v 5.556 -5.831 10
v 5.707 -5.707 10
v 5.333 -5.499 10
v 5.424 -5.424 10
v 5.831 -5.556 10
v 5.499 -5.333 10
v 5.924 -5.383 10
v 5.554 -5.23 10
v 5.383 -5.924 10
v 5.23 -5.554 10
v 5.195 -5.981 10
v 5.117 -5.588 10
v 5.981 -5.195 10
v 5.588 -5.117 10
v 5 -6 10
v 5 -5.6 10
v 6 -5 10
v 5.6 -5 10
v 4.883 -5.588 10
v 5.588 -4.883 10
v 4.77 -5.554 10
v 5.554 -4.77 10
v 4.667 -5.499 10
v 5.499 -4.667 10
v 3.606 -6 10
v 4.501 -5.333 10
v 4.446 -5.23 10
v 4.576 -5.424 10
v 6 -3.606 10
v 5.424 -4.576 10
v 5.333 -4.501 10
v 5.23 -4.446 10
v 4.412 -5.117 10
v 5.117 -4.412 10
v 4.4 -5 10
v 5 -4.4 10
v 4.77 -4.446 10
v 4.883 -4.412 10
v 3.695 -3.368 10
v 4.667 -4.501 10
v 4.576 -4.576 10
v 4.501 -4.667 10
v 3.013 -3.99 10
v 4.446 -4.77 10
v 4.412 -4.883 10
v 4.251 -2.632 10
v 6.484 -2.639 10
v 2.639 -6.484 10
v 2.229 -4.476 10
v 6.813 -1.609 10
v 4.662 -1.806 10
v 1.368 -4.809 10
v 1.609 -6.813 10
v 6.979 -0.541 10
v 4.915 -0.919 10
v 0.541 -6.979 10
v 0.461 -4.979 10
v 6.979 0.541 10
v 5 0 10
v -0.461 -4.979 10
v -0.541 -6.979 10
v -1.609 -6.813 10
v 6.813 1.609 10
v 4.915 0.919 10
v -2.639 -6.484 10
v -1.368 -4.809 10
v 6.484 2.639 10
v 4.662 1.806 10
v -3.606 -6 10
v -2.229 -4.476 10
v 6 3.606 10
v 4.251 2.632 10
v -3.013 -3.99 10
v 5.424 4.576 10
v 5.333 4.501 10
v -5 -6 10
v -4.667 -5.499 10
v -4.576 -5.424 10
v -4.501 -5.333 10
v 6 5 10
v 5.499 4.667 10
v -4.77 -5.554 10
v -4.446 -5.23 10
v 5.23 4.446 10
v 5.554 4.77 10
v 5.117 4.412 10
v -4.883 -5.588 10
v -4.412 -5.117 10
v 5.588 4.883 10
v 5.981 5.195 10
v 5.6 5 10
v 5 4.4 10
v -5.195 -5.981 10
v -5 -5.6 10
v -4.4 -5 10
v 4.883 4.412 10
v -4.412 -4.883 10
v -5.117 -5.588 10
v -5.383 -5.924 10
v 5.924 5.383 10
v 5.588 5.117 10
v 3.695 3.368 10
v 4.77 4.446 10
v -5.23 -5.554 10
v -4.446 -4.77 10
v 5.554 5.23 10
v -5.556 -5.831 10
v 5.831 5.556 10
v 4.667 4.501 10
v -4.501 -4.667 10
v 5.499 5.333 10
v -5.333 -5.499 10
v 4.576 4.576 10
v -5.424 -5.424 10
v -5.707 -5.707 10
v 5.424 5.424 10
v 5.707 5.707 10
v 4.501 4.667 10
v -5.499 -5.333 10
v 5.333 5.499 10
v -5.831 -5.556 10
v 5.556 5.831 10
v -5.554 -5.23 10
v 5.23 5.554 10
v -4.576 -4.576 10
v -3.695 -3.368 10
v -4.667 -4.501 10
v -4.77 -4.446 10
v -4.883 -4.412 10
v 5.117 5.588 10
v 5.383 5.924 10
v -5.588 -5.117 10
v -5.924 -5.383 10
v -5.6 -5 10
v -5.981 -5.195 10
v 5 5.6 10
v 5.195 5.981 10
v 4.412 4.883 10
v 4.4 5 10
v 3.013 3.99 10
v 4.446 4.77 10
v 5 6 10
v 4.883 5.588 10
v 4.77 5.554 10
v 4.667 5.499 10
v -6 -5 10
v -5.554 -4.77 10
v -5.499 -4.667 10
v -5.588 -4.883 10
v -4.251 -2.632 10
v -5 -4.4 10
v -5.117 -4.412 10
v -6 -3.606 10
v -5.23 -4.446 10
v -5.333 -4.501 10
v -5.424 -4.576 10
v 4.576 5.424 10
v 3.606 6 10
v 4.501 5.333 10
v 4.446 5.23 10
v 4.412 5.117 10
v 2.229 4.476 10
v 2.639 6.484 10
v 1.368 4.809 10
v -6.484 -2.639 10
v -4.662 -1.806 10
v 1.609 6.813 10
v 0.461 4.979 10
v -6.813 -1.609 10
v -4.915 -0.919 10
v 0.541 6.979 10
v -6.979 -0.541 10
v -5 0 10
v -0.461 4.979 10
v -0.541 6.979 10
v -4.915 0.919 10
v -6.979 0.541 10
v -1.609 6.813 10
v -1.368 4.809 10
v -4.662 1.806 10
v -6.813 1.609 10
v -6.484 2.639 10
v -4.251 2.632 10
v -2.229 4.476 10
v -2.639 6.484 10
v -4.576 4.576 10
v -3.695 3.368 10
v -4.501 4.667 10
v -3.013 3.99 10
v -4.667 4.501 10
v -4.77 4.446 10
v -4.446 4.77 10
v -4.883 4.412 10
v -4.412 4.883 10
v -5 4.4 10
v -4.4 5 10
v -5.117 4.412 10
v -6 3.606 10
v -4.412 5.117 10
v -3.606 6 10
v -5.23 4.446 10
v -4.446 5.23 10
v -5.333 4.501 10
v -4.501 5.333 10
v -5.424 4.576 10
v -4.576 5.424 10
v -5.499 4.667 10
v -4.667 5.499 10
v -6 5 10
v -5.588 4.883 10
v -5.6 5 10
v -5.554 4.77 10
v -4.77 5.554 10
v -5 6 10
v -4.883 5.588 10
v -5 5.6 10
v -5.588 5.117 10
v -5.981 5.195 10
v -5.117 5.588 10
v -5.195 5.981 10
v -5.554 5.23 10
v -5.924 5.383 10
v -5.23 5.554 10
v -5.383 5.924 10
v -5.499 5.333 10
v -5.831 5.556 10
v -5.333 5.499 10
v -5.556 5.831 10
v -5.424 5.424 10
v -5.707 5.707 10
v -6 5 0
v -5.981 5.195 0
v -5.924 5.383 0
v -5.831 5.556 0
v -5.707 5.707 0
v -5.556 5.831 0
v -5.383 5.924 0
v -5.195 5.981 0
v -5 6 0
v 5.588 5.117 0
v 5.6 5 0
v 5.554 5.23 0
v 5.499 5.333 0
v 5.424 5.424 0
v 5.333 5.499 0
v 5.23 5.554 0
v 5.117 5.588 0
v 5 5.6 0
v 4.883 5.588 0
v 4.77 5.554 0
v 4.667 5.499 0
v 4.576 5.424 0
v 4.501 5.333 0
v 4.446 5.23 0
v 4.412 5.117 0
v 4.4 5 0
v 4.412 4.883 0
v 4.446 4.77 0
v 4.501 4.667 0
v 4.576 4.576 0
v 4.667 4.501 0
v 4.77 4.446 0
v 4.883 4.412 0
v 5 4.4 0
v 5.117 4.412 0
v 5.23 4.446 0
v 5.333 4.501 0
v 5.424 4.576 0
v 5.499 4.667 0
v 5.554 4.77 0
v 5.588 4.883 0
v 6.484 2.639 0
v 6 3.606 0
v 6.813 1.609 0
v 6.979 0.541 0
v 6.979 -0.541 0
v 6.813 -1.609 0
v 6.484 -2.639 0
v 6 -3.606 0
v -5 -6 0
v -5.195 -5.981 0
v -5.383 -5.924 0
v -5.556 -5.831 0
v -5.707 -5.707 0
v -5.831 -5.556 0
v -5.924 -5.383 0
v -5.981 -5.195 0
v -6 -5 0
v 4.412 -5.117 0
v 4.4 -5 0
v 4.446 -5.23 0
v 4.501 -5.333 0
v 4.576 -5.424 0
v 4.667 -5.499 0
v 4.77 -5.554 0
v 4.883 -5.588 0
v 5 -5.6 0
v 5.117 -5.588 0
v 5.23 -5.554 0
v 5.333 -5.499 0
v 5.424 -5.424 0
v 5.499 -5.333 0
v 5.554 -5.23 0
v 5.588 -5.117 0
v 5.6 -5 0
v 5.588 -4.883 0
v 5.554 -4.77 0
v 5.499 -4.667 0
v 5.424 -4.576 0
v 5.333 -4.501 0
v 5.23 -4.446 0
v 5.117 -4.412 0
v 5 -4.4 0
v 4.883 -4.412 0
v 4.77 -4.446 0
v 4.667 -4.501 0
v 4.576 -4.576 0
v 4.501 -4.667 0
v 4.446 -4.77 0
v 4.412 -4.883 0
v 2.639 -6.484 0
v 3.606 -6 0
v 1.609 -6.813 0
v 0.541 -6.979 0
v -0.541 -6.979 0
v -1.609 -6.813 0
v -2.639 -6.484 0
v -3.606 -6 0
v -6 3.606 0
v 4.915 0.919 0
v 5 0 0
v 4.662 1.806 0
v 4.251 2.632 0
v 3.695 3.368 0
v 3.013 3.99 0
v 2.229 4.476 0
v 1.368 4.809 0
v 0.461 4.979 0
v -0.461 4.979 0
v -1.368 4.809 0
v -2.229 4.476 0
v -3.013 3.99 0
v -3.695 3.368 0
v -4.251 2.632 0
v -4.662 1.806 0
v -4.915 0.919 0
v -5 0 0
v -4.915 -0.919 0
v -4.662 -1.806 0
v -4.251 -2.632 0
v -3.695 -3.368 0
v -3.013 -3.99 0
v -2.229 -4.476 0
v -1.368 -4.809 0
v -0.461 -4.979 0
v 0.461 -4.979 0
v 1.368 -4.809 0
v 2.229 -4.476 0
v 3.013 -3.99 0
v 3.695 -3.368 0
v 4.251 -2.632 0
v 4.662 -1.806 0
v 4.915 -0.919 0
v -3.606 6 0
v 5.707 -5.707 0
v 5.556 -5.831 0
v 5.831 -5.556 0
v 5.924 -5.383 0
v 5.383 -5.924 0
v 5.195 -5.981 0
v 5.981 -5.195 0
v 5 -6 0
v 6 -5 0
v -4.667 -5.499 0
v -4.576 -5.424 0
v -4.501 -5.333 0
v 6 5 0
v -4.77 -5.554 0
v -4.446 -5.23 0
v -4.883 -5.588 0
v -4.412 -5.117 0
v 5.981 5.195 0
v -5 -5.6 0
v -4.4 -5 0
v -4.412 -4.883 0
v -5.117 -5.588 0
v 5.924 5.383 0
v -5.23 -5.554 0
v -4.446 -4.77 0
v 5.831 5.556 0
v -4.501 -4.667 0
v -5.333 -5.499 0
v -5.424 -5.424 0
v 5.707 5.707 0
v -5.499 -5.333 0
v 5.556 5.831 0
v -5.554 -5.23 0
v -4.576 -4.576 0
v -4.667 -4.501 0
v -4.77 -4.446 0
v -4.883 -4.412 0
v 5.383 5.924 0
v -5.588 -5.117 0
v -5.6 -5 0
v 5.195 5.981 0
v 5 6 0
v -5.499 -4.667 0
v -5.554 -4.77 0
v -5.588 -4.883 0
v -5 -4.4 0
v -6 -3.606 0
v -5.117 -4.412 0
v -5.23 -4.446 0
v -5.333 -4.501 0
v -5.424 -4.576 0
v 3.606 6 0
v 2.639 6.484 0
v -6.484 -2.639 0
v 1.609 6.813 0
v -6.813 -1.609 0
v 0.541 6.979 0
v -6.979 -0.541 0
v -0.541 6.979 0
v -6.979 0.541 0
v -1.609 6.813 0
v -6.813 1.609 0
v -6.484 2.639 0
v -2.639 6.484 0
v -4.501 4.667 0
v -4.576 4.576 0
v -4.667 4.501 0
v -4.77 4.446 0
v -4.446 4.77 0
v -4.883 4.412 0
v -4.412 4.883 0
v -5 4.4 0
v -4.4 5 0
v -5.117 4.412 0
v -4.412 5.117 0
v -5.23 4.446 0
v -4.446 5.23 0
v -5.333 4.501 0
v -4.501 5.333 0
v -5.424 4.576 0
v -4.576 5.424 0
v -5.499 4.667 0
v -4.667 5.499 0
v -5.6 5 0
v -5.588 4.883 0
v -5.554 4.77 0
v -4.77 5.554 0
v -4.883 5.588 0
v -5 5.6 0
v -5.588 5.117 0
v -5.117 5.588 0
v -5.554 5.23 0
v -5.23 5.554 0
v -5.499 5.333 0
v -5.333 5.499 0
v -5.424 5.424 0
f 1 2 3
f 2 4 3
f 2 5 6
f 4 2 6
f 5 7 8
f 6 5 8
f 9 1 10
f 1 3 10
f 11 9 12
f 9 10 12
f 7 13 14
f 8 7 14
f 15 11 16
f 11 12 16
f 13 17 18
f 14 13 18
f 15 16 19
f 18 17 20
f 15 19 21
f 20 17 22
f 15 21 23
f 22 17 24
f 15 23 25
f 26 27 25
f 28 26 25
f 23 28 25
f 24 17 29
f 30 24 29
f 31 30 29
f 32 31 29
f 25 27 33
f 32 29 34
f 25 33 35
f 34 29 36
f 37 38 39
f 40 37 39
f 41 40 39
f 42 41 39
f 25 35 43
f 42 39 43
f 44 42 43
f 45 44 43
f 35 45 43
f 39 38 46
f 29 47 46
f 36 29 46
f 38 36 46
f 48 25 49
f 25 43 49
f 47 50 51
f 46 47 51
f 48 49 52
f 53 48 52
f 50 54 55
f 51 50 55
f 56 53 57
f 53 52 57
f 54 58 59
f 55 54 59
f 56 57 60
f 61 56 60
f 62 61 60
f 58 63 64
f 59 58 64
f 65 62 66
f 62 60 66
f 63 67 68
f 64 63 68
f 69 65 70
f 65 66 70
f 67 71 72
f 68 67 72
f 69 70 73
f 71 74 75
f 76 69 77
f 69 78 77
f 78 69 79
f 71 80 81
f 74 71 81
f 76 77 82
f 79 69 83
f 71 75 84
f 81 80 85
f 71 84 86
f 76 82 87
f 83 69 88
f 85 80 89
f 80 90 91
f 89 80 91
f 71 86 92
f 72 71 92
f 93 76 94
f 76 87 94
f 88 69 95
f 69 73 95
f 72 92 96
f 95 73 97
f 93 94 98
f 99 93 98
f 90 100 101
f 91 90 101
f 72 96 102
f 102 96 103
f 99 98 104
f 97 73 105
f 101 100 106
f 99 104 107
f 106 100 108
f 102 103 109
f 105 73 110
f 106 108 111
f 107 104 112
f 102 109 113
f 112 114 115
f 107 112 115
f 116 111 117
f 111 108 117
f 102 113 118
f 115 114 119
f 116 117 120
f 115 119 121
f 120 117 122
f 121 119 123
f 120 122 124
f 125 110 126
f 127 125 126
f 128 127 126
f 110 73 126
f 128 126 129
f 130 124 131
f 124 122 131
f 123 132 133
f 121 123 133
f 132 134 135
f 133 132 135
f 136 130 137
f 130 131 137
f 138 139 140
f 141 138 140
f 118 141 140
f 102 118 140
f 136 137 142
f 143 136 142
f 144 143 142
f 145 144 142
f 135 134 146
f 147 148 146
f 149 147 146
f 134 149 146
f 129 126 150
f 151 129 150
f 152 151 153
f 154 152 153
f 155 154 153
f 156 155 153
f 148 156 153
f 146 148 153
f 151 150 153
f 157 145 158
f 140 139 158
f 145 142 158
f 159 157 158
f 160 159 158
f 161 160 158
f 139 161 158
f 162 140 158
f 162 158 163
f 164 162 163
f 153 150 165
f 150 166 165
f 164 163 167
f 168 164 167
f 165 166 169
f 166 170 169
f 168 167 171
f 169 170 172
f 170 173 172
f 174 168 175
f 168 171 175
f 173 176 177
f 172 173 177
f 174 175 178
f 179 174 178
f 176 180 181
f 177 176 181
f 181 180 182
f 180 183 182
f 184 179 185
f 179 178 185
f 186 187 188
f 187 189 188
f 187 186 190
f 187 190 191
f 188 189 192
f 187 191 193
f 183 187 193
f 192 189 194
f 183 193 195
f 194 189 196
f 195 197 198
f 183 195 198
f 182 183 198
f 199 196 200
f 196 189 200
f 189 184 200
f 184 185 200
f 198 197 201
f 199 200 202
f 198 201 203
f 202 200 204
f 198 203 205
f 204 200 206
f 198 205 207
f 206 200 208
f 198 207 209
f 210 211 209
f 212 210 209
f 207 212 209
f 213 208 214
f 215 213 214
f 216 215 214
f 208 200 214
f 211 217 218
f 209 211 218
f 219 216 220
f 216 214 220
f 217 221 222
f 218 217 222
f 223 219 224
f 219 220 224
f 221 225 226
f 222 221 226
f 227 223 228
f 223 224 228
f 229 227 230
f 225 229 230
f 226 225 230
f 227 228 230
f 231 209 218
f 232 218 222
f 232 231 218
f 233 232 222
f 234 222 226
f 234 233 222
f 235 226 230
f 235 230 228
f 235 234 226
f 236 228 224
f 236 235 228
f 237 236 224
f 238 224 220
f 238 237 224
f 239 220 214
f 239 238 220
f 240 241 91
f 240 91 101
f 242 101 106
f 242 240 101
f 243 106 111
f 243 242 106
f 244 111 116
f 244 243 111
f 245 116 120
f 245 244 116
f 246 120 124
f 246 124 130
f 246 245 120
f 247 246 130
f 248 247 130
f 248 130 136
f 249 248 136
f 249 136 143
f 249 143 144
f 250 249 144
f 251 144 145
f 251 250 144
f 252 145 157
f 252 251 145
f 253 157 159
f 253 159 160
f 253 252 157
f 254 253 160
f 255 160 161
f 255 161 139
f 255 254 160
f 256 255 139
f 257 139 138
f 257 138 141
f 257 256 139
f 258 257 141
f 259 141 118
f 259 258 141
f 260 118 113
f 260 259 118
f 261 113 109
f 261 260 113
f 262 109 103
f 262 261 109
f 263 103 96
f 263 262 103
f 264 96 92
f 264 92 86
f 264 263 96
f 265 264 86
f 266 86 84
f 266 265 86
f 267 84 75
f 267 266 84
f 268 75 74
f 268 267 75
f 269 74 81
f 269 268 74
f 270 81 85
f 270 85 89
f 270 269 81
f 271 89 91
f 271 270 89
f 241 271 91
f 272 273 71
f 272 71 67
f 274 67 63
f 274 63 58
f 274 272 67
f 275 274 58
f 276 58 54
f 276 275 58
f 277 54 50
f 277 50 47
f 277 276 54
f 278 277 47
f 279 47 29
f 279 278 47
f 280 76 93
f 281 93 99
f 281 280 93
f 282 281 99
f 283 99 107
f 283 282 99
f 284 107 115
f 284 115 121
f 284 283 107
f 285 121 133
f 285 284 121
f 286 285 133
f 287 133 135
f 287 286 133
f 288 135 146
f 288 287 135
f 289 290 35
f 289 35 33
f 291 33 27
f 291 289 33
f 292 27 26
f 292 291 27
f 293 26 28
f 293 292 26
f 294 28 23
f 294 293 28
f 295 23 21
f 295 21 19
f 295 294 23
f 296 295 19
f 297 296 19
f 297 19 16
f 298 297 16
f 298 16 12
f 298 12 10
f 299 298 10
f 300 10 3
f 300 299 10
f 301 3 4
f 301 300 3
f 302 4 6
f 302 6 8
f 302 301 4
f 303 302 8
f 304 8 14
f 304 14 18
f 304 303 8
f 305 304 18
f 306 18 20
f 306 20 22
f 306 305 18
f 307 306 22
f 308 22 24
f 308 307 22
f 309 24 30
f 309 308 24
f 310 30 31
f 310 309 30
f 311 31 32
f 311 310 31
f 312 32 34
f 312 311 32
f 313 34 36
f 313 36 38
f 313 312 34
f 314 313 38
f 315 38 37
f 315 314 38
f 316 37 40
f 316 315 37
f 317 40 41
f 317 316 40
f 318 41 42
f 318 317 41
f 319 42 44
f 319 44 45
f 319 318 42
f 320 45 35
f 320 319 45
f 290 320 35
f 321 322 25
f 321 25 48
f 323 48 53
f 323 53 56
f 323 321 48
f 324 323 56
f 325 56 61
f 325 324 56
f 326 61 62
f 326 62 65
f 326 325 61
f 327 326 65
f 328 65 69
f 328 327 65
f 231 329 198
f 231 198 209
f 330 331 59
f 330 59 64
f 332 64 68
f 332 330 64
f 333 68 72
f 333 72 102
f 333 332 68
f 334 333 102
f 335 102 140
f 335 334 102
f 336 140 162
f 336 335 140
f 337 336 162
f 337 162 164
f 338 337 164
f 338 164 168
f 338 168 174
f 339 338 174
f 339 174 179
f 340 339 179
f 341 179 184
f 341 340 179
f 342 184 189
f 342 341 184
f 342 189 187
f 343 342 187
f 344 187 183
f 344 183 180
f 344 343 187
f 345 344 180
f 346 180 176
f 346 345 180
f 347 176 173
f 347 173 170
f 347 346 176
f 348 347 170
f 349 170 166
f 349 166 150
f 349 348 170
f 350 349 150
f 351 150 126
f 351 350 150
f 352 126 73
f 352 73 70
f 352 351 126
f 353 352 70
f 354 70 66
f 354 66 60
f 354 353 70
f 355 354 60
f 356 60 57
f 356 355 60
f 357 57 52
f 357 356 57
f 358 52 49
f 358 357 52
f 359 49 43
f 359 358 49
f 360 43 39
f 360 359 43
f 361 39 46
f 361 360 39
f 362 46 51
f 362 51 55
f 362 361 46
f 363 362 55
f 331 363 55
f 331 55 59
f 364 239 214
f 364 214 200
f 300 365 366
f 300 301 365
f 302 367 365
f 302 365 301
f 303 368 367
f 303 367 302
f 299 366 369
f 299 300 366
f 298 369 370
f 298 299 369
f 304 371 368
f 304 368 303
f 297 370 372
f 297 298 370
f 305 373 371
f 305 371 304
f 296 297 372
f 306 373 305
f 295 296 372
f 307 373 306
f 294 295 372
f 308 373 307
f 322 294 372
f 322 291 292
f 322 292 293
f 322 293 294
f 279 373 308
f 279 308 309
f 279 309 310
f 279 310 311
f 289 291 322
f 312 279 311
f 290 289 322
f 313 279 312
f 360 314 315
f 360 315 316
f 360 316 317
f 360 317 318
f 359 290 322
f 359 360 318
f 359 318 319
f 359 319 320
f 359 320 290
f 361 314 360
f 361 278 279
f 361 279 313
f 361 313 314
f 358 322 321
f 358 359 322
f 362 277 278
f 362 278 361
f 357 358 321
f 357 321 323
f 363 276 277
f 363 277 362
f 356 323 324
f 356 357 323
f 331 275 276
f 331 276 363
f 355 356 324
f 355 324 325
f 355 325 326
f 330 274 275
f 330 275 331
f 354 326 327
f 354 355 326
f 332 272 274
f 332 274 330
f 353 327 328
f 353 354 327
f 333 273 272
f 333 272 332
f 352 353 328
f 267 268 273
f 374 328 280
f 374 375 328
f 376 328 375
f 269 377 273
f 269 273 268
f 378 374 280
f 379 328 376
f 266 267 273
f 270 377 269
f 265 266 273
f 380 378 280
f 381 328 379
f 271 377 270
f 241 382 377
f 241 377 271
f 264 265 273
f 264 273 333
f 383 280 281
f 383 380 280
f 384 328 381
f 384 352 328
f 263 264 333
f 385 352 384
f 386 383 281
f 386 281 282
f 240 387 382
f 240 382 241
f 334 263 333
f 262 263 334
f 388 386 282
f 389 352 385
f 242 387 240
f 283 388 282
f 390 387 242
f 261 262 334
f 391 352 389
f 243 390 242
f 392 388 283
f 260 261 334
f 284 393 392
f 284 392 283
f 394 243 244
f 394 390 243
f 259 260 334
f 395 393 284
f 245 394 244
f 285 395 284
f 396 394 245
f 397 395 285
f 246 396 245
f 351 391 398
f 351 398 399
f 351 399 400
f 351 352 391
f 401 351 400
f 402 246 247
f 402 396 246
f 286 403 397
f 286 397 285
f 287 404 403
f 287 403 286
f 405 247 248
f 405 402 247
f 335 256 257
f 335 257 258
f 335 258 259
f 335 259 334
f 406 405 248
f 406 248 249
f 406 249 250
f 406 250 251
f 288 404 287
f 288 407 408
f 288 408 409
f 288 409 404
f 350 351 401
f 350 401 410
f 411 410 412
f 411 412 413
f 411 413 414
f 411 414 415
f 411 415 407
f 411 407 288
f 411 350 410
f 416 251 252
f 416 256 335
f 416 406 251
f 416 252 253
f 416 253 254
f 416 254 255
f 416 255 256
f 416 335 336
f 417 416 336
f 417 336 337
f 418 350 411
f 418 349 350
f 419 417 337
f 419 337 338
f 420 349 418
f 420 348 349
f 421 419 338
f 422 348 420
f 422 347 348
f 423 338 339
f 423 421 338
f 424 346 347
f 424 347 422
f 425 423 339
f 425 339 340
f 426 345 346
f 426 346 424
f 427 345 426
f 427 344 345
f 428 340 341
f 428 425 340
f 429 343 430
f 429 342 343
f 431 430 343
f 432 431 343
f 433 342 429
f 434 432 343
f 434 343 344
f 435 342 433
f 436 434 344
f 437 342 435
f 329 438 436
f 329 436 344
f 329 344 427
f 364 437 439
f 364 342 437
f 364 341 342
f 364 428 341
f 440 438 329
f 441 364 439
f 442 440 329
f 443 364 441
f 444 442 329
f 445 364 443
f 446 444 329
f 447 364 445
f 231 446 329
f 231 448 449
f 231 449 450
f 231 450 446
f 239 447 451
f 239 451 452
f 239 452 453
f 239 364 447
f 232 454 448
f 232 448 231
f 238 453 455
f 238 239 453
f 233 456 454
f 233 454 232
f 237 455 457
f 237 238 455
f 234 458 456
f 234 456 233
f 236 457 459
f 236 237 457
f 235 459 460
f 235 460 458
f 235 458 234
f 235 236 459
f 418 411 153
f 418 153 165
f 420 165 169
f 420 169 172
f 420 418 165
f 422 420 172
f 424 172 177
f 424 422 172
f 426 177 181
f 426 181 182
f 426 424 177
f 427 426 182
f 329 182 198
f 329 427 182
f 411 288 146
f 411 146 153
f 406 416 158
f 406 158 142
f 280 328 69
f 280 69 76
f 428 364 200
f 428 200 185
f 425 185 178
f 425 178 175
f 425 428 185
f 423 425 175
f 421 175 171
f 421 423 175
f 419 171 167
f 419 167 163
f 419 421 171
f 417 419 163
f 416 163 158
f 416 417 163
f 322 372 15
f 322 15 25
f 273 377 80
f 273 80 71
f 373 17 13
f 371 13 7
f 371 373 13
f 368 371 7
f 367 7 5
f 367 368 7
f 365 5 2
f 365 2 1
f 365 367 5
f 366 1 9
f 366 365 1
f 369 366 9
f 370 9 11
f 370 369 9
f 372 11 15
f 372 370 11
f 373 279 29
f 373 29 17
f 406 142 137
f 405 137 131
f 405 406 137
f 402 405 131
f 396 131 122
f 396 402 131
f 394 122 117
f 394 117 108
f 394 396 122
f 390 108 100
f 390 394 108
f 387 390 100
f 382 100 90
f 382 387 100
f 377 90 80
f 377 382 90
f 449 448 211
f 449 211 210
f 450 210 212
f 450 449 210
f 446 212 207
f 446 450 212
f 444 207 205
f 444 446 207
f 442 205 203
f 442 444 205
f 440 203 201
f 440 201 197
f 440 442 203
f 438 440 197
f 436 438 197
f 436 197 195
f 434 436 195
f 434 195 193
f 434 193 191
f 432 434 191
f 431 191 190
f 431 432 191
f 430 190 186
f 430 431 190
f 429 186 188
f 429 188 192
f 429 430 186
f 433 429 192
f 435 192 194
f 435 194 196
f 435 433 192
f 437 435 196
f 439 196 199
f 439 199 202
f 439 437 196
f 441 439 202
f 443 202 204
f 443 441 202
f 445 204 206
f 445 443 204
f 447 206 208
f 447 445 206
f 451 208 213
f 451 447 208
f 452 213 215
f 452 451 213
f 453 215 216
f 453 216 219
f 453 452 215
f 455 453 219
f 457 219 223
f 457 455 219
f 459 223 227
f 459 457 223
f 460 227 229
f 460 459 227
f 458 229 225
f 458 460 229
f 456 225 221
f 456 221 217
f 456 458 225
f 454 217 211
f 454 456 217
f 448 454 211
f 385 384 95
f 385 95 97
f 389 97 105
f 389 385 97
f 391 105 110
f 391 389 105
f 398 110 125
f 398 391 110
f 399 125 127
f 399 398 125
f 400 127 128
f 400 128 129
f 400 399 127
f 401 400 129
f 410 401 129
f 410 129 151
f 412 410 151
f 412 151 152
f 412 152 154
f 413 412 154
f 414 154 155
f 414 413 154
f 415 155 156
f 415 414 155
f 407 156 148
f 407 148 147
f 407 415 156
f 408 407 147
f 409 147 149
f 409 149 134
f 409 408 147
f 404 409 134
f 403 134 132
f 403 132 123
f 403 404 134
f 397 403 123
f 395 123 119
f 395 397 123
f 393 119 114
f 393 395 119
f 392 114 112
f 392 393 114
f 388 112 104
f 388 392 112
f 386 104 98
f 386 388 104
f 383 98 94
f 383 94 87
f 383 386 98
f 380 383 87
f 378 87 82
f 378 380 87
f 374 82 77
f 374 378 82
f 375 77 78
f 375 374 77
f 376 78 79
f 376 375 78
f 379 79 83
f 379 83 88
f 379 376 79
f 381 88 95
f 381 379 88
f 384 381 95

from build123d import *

# Parameters (mm, degrees)
SKETCH1_R           = 0.6
SKETCH1_R_2         = 5
BOSS_EXTRUDE1_DEPTH = 10


with BuildPart() as part:
    # Sketch1 → Boss-Extrude1 (new body)
    with BuildSketch(Plane.XY):
        with BuildLine():
            Line((3.605551275, 6), (5, 6))
            ThreePointArc((5, 6), (5.707106781, 5.707106781), (6, 5))
            Line((6, 5), (6, 3.605551275))
            ThreePointArc((6, 3.605551275), (7, 0), (6, -3.605551275))
            Line((6, -3.605551275), (6, -5))
            ThreePointArc((6, -5), (5.707106781, -5.707106781), (5, -6))
            Line((5, -6), (3.605551275, -6))
            ThreePointArc((3.605551275, -6), (0, -7), (-3.605551275, -6))
            Line((-3.605551275, -6), (-5, -6))
            ThreePointArc((-5, -6), (-5.707106781, -5.707106781), (-6, -5))
            Line((-6, -5), (-6, -3.605551275))
            ThreePointArc((-6, -3.605551275), (-7, 0), (-6, 3.605551275))
            Line((-6, 3.605551275), (-6, 5))
            ThreePointArc((-6, 5), (-5.707106781, 5.707106781), (-5, 6))
            Line((-5, 6), (-3.605551275, 6))
            ThreePointArc((-3.605551275, 6), (0, 7), (3.605551275, 6))
        make_face()
        with Locations((5, 5)):
            Circle(SKETCH1_R, mode=Mode.SUBTRACT)
        with Locations(Location((-5, 5, 0), (0, 0, 180))):
            Circle(SKETCH1_R, mode=Mode.SUBTRACT)
        with Locations(Location((5, -5, 0), (0, 0, 180))):
            Circle(SKETCH1_R, mode=Mode.SUBTRACT)
        with Locations((-5, -5)):
            Circle(SKETCH1_R, mode=Mode.SUBTRACT)
        Circle(SKETCH1_R_2, mode=Mode.SUBTRACT)
    extrude(amount=BOSS_EXTRUDE1_DEPTH)


solid = part.part
